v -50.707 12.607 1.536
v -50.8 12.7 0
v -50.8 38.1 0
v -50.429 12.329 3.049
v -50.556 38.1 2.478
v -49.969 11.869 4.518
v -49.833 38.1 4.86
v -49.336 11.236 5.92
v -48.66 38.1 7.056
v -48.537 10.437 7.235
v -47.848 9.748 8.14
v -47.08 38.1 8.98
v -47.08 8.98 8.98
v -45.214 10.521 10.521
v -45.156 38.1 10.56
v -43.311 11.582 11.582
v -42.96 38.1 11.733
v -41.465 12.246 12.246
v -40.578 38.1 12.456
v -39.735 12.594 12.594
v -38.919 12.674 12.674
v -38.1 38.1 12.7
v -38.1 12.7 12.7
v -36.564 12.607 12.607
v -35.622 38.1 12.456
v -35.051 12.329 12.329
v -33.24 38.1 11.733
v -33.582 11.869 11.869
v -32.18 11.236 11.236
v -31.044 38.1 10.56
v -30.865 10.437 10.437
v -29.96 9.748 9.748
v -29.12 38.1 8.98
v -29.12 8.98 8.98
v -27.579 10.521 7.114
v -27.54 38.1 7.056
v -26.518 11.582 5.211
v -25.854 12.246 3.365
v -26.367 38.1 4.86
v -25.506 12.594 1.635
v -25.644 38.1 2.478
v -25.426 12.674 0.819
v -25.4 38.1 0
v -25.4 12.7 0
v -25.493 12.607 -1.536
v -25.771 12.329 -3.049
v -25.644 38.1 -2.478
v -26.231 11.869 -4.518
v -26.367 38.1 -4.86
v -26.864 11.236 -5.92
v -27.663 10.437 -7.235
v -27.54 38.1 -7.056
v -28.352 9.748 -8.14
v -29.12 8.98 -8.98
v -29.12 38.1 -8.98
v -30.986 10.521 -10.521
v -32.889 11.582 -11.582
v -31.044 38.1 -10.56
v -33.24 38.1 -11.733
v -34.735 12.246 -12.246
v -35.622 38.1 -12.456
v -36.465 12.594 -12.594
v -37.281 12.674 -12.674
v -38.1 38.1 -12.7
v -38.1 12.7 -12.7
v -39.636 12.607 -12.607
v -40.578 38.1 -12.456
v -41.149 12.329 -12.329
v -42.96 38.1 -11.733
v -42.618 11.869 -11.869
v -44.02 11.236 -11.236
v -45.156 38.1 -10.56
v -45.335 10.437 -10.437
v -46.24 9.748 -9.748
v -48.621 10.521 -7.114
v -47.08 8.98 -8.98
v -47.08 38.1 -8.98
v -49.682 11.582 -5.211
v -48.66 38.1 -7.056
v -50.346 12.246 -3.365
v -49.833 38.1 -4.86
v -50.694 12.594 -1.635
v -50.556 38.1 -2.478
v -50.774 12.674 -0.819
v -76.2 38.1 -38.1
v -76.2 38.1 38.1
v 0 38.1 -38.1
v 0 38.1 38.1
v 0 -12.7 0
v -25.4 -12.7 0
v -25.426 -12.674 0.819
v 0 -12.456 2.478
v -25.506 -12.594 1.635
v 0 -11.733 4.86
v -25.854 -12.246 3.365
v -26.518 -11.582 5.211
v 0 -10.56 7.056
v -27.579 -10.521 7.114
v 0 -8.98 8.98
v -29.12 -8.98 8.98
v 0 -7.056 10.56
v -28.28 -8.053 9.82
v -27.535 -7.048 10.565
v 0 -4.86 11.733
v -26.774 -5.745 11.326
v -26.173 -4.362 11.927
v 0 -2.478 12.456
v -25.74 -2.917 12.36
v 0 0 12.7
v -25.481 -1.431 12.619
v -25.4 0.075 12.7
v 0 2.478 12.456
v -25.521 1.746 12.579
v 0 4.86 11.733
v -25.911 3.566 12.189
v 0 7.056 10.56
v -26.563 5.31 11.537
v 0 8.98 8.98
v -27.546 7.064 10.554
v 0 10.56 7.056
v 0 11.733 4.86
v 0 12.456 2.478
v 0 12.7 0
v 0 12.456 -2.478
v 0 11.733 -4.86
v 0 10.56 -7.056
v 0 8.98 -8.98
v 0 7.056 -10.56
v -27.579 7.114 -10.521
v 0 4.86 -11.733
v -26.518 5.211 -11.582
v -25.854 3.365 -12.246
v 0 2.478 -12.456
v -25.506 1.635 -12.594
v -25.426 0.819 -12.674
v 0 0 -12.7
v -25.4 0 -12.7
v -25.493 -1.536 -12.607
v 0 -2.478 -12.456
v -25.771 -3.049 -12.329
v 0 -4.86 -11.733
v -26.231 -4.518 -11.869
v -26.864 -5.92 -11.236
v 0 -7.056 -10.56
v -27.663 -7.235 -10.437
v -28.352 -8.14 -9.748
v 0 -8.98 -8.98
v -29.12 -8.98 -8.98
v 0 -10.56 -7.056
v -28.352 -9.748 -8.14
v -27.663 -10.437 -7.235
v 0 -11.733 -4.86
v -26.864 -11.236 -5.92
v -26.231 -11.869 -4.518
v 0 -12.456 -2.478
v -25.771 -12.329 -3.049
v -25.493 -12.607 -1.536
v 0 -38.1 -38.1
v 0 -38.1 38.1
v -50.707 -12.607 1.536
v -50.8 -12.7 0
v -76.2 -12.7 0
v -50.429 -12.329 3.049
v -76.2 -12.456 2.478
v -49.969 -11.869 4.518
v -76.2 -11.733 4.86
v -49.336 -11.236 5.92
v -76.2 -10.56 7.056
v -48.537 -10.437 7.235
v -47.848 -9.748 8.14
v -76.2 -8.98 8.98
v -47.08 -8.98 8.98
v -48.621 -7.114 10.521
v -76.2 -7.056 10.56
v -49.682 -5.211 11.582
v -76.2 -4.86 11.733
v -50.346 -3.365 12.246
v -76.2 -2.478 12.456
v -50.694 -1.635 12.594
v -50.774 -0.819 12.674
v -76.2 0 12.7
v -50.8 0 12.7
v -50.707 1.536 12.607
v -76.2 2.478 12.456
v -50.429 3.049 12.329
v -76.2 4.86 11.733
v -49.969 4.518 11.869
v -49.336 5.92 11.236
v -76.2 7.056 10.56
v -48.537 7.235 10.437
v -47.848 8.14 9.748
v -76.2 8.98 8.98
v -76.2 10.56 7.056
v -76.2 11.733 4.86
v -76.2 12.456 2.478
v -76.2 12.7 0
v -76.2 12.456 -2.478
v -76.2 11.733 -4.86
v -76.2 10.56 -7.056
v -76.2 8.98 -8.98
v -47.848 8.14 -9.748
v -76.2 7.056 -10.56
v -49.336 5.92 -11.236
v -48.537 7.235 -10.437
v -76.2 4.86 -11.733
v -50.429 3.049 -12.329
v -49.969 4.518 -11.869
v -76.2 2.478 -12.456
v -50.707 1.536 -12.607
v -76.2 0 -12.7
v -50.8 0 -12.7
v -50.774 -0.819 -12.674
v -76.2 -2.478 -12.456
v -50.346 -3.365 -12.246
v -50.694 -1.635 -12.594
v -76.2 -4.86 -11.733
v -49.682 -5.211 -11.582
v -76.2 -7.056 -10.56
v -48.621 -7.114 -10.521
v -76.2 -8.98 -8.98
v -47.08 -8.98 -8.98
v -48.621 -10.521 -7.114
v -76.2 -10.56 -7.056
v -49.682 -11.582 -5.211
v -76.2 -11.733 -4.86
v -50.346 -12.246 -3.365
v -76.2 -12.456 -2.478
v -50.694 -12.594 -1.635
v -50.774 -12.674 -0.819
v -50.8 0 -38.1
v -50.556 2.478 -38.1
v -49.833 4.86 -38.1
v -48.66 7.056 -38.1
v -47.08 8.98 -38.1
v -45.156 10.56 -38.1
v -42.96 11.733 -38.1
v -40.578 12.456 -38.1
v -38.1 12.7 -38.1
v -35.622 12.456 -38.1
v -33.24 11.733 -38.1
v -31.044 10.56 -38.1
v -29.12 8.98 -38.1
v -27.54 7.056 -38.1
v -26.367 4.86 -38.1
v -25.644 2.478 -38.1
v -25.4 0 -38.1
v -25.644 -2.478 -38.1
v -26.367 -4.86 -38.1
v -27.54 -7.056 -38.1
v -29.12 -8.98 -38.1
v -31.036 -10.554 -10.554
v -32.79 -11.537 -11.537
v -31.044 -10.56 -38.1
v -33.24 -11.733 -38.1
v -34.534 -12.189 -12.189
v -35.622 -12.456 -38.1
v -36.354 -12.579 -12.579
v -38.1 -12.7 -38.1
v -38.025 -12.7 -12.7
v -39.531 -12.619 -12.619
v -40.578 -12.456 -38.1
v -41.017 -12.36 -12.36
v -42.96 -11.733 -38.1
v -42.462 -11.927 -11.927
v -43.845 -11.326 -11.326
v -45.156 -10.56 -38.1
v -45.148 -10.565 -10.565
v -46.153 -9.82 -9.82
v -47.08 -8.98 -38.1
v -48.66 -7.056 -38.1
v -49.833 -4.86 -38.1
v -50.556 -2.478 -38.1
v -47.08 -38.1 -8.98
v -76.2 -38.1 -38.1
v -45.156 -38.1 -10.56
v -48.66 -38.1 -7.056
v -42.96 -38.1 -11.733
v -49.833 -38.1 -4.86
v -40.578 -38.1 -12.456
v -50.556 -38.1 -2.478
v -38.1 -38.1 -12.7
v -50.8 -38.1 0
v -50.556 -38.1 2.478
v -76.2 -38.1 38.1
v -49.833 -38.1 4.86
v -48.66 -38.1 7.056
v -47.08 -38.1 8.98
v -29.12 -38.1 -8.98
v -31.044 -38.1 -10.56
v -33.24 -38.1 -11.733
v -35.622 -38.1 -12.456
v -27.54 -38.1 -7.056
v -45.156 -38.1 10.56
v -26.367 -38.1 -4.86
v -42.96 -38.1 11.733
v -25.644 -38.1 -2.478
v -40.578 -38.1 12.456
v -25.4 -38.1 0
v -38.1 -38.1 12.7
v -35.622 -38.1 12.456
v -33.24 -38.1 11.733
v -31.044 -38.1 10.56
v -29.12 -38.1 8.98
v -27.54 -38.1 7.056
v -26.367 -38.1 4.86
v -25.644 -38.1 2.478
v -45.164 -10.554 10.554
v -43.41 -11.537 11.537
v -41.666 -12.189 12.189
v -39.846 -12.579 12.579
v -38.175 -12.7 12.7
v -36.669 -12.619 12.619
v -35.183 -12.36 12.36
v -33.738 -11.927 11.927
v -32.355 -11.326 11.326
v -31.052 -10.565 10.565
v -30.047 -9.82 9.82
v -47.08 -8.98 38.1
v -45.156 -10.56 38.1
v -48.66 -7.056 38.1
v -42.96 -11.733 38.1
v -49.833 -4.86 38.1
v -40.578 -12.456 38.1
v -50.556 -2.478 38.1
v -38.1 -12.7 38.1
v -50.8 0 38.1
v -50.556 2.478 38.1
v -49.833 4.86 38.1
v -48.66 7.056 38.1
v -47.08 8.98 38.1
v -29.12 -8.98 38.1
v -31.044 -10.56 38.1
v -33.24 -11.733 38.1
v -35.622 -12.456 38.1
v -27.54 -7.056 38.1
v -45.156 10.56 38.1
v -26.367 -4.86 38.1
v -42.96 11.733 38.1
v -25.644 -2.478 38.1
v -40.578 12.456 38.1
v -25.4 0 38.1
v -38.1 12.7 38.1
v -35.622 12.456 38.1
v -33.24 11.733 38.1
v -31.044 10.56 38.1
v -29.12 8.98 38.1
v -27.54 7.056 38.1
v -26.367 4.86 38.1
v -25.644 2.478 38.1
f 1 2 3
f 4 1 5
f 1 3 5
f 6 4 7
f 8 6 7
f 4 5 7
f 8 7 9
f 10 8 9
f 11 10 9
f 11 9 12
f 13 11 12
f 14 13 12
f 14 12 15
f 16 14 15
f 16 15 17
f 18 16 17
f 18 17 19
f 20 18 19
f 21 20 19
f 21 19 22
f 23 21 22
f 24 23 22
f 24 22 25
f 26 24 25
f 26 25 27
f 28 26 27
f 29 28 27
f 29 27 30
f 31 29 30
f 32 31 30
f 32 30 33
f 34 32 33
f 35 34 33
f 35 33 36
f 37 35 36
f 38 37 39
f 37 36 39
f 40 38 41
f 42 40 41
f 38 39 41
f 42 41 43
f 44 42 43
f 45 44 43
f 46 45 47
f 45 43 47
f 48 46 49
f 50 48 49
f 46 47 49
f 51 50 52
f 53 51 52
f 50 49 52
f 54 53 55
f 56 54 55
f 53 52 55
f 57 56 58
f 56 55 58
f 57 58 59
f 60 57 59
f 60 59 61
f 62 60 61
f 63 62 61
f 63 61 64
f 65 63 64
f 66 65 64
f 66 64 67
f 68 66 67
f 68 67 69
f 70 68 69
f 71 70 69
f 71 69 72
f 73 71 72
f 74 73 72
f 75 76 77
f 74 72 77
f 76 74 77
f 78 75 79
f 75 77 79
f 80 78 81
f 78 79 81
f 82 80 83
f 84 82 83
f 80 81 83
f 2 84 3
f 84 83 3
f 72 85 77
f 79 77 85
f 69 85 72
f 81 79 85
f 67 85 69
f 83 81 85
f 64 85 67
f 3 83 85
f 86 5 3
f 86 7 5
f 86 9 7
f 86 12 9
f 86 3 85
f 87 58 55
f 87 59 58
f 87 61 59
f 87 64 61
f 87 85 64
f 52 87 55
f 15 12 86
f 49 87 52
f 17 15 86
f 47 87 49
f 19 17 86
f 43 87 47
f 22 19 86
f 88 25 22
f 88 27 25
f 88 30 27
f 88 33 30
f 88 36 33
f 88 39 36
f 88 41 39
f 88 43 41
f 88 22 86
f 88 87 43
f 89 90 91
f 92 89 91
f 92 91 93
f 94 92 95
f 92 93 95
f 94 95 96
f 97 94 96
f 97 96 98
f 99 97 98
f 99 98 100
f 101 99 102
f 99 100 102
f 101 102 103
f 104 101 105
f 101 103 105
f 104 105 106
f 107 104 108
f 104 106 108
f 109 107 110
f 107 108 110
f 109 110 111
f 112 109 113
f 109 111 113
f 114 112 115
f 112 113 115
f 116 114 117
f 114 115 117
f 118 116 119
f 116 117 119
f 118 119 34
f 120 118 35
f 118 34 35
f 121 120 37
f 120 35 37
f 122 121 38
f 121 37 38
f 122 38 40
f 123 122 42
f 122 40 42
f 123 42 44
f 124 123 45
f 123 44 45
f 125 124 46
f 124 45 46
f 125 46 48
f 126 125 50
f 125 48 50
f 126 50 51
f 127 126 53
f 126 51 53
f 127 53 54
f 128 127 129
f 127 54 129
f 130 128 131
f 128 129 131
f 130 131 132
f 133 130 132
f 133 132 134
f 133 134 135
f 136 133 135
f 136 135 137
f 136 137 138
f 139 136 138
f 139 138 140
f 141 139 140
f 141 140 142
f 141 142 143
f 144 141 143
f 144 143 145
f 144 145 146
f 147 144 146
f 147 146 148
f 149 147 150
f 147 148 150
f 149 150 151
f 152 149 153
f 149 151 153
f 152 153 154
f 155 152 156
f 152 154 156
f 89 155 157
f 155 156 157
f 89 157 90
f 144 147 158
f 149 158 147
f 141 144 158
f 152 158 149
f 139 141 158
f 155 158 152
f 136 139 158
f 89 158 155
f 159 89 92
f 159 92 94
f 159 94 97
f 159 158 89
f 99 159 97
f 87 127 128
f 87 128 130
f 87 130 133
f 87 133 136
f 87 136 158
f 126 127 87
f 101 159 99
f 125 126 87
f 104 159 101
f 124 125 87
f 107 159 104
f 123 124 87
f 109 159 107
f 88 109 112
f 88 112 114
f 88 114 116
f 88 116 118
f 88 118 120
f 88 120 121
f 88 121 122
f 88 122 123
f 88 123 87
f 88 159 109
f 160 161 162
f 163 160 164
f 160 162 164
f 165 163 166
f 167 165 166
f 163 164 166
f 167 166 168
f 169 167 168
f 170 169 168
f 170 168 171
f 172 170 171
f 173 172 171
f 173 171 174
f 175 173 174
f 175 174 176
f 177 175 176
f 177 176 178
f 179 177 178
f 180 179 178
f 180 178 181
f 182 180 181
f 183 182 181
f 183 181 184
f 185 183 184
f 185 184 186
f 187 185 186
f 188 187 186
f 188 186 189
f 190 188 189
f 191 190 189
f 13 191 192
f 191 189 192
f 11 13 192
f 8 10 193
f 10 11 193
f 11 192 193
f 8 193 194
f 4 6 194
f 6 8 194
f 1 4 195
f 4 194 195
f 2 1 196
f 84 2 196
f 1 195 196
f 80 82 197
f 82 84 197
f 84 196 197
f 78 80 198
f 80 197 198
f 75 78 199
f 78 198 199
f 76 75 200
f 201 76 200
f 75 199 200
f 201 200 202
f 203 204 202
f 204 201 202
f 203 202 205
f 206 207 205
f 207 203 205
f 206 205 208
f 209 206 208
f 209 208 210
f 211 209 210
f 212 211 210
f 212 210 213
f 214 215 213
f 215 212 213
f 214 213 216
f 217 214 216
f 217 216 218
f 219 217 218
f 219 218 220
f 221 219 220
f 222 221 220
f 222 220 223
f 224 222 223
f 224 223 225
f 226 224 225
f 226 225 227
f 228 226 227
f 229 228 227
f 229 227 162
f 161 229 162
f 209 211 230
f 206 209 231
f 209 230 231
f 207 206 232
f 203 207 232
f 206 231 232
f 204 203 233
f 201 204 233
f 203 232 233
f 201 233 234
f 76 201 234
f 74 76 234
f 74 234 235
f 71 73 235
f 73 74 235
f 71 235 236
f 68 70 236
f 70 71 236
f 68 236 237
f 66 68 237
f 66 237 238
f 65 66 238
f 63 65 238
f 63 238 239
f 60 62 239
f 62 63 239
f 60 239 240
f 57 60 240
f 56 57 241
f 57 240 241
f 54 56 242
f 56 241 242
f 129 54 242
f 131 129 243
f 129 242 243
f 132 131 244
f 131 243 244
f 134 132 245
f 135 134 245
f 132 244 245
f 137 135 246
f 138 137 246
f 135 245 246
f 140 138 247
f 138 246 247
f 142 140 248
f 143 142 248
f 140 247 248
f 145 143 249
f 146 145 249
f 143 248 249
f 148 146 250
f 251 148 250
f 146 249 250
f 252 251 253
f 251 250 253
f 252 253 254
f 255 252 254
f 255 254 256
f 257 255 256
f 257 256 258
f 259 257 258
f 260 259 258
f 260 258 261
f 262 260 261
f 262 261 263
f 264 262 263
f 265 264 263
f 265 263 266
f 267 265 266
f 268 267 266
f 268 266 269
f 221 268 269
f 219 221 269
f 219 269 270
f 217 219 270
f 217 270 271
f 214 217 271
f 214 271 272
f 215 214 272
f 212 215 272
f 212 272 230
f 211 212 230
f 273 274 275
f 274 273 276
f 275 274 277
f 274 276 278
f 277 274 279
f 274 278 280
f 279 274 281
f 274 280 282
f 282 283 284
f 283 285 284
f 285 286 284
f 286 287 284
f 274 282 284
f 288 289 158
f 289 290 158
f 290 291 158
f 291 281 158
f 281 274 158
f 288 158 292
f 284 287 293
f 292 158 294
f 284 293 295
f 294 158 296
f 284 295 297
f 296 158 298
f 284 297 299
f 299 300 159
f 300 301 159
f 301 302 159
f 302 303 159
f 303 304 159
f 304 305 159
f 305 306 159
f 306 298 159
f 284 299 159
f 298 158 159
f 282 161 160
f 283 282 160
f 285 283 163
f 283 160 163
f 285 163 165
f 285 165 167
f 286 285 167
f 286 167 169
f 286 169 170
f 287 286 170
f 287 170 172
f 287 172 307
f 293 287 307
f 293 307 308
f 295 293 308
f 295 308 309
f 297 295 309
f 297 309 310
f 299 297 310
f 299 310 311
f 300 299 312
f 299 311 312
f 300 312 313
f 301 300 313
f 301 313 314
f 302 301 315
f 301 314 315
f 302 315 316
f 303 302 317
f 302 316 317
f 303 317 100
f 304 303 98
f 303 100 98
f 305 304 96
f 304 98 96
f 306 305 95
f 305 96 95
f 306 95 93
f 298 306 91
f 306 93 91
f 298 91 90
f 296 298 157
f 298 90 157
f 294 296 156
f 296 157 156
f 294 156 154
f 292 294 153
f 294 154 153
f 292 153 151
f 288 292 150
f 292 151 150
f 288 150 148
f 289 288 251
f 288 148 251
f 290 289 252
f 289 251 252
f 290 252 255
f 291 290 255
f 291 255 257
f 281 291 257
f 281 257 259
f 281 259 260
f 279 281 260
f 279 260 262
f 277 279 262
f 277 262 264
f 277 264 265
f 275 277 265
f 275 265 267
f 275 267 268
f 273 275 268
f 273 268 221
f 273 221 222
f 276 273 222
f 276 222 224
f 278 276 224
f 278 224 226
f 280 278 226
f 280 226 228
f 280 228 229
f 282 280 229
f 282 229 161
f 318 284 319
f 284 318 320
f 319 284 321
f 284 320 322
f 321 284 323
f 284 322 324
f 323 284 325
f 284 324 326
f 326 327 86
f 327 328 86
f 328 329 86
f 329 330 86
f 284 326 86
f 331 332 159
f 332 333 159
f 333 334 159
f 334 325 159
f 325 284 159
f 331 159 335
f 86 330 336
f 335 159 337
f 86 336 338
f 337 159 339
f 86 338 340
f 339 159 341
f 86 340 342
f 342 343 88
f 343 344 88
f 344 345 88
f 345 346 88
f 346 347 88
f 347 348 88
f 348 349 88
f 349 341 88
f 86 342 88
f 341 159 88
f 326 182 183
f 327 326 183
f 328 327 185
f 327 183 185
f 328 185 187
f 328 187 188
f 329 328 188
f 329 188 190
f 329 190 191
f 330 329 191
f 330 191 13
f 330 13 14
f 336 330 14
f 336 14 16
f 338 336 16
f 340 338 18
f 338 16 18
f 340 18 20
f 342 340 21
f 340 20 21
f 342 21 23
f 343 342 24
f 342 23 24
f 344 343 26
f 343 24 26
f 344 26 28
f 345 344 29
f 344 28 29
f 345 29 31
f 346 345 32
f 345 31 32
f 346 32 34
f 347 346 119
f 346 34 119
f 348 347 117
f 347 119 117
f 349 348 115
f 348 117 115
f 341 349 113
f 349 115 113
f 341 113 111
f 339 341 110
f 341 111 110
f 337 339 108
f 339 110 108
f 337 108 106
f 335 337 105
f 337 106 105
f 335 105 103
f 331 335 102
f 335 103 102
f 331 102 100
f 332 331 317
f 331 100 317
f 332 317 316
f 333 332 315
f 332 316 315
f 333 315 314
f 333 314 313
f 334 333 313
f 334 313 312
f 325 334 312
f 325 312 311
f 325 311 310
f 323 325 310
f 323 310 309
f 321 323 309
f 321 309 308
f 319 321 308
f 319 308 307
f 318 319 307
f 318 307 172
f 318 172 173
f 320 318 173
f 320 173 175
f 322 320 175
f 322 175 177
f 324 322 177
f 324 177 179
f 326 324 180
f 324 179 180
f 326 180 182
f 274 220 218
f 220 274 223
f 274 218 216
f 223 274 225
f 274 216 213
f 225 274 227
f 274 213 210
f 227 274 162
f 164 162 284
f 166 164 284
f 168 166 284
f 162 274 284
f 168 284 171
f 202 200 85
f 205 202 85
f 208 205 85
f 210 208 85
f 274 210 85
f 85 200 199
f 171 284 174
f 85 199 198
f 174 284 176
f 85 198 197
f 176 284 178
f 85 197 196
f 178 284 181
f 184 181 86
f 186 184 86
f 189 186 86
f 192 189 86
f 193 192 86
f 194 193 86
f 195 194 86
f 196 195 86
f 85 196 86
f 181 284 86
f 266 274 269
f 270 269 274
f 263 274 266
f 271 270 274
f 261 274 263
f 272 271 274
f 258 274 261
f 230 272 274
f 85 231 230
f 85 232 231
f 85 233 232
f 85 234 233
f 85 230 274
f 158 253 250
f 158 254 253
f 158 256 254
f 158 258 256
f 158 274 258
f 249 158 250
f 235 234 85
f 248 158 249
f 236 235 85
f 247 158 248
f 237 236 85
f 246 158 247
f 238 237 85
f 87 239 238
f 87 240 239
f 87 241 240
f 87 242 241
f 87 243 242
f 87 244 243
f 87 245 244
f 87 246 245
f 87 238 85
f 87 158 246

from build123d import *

# Parameters (mm, degrees)
F6_W     = 76.2
F6_H     = 76.2
F0_DEPTH = 76.2
F1_D     = 25.4
F8_D     = 25.4
F4_D     = 25.4


with BuildPart() as f0:
    # F6 (on Right) → F0 (new body)
    with BuildSketch(Plane.YZ):
        Rectangle(F6_W, F6_H)
    extrude(amount=-F0_DEPTH)

    # F1 (through all)
    with Locations(Plane.XZ.offset(38.1)):
        with Locations((-38.1, 0)):
            Hole(F1_D / 2)

    # F8 (through all)
    with Locations(Plane.XY.offset(38.1)):
        with Locations((-38.1, 0)):
            Hole(F8_D / 2)

    # F4 (through all)
    with Locations(Plane.YZ):
        with Locations((0, 0)):
            Hole(F4_D / 2)


solid = f0.part
